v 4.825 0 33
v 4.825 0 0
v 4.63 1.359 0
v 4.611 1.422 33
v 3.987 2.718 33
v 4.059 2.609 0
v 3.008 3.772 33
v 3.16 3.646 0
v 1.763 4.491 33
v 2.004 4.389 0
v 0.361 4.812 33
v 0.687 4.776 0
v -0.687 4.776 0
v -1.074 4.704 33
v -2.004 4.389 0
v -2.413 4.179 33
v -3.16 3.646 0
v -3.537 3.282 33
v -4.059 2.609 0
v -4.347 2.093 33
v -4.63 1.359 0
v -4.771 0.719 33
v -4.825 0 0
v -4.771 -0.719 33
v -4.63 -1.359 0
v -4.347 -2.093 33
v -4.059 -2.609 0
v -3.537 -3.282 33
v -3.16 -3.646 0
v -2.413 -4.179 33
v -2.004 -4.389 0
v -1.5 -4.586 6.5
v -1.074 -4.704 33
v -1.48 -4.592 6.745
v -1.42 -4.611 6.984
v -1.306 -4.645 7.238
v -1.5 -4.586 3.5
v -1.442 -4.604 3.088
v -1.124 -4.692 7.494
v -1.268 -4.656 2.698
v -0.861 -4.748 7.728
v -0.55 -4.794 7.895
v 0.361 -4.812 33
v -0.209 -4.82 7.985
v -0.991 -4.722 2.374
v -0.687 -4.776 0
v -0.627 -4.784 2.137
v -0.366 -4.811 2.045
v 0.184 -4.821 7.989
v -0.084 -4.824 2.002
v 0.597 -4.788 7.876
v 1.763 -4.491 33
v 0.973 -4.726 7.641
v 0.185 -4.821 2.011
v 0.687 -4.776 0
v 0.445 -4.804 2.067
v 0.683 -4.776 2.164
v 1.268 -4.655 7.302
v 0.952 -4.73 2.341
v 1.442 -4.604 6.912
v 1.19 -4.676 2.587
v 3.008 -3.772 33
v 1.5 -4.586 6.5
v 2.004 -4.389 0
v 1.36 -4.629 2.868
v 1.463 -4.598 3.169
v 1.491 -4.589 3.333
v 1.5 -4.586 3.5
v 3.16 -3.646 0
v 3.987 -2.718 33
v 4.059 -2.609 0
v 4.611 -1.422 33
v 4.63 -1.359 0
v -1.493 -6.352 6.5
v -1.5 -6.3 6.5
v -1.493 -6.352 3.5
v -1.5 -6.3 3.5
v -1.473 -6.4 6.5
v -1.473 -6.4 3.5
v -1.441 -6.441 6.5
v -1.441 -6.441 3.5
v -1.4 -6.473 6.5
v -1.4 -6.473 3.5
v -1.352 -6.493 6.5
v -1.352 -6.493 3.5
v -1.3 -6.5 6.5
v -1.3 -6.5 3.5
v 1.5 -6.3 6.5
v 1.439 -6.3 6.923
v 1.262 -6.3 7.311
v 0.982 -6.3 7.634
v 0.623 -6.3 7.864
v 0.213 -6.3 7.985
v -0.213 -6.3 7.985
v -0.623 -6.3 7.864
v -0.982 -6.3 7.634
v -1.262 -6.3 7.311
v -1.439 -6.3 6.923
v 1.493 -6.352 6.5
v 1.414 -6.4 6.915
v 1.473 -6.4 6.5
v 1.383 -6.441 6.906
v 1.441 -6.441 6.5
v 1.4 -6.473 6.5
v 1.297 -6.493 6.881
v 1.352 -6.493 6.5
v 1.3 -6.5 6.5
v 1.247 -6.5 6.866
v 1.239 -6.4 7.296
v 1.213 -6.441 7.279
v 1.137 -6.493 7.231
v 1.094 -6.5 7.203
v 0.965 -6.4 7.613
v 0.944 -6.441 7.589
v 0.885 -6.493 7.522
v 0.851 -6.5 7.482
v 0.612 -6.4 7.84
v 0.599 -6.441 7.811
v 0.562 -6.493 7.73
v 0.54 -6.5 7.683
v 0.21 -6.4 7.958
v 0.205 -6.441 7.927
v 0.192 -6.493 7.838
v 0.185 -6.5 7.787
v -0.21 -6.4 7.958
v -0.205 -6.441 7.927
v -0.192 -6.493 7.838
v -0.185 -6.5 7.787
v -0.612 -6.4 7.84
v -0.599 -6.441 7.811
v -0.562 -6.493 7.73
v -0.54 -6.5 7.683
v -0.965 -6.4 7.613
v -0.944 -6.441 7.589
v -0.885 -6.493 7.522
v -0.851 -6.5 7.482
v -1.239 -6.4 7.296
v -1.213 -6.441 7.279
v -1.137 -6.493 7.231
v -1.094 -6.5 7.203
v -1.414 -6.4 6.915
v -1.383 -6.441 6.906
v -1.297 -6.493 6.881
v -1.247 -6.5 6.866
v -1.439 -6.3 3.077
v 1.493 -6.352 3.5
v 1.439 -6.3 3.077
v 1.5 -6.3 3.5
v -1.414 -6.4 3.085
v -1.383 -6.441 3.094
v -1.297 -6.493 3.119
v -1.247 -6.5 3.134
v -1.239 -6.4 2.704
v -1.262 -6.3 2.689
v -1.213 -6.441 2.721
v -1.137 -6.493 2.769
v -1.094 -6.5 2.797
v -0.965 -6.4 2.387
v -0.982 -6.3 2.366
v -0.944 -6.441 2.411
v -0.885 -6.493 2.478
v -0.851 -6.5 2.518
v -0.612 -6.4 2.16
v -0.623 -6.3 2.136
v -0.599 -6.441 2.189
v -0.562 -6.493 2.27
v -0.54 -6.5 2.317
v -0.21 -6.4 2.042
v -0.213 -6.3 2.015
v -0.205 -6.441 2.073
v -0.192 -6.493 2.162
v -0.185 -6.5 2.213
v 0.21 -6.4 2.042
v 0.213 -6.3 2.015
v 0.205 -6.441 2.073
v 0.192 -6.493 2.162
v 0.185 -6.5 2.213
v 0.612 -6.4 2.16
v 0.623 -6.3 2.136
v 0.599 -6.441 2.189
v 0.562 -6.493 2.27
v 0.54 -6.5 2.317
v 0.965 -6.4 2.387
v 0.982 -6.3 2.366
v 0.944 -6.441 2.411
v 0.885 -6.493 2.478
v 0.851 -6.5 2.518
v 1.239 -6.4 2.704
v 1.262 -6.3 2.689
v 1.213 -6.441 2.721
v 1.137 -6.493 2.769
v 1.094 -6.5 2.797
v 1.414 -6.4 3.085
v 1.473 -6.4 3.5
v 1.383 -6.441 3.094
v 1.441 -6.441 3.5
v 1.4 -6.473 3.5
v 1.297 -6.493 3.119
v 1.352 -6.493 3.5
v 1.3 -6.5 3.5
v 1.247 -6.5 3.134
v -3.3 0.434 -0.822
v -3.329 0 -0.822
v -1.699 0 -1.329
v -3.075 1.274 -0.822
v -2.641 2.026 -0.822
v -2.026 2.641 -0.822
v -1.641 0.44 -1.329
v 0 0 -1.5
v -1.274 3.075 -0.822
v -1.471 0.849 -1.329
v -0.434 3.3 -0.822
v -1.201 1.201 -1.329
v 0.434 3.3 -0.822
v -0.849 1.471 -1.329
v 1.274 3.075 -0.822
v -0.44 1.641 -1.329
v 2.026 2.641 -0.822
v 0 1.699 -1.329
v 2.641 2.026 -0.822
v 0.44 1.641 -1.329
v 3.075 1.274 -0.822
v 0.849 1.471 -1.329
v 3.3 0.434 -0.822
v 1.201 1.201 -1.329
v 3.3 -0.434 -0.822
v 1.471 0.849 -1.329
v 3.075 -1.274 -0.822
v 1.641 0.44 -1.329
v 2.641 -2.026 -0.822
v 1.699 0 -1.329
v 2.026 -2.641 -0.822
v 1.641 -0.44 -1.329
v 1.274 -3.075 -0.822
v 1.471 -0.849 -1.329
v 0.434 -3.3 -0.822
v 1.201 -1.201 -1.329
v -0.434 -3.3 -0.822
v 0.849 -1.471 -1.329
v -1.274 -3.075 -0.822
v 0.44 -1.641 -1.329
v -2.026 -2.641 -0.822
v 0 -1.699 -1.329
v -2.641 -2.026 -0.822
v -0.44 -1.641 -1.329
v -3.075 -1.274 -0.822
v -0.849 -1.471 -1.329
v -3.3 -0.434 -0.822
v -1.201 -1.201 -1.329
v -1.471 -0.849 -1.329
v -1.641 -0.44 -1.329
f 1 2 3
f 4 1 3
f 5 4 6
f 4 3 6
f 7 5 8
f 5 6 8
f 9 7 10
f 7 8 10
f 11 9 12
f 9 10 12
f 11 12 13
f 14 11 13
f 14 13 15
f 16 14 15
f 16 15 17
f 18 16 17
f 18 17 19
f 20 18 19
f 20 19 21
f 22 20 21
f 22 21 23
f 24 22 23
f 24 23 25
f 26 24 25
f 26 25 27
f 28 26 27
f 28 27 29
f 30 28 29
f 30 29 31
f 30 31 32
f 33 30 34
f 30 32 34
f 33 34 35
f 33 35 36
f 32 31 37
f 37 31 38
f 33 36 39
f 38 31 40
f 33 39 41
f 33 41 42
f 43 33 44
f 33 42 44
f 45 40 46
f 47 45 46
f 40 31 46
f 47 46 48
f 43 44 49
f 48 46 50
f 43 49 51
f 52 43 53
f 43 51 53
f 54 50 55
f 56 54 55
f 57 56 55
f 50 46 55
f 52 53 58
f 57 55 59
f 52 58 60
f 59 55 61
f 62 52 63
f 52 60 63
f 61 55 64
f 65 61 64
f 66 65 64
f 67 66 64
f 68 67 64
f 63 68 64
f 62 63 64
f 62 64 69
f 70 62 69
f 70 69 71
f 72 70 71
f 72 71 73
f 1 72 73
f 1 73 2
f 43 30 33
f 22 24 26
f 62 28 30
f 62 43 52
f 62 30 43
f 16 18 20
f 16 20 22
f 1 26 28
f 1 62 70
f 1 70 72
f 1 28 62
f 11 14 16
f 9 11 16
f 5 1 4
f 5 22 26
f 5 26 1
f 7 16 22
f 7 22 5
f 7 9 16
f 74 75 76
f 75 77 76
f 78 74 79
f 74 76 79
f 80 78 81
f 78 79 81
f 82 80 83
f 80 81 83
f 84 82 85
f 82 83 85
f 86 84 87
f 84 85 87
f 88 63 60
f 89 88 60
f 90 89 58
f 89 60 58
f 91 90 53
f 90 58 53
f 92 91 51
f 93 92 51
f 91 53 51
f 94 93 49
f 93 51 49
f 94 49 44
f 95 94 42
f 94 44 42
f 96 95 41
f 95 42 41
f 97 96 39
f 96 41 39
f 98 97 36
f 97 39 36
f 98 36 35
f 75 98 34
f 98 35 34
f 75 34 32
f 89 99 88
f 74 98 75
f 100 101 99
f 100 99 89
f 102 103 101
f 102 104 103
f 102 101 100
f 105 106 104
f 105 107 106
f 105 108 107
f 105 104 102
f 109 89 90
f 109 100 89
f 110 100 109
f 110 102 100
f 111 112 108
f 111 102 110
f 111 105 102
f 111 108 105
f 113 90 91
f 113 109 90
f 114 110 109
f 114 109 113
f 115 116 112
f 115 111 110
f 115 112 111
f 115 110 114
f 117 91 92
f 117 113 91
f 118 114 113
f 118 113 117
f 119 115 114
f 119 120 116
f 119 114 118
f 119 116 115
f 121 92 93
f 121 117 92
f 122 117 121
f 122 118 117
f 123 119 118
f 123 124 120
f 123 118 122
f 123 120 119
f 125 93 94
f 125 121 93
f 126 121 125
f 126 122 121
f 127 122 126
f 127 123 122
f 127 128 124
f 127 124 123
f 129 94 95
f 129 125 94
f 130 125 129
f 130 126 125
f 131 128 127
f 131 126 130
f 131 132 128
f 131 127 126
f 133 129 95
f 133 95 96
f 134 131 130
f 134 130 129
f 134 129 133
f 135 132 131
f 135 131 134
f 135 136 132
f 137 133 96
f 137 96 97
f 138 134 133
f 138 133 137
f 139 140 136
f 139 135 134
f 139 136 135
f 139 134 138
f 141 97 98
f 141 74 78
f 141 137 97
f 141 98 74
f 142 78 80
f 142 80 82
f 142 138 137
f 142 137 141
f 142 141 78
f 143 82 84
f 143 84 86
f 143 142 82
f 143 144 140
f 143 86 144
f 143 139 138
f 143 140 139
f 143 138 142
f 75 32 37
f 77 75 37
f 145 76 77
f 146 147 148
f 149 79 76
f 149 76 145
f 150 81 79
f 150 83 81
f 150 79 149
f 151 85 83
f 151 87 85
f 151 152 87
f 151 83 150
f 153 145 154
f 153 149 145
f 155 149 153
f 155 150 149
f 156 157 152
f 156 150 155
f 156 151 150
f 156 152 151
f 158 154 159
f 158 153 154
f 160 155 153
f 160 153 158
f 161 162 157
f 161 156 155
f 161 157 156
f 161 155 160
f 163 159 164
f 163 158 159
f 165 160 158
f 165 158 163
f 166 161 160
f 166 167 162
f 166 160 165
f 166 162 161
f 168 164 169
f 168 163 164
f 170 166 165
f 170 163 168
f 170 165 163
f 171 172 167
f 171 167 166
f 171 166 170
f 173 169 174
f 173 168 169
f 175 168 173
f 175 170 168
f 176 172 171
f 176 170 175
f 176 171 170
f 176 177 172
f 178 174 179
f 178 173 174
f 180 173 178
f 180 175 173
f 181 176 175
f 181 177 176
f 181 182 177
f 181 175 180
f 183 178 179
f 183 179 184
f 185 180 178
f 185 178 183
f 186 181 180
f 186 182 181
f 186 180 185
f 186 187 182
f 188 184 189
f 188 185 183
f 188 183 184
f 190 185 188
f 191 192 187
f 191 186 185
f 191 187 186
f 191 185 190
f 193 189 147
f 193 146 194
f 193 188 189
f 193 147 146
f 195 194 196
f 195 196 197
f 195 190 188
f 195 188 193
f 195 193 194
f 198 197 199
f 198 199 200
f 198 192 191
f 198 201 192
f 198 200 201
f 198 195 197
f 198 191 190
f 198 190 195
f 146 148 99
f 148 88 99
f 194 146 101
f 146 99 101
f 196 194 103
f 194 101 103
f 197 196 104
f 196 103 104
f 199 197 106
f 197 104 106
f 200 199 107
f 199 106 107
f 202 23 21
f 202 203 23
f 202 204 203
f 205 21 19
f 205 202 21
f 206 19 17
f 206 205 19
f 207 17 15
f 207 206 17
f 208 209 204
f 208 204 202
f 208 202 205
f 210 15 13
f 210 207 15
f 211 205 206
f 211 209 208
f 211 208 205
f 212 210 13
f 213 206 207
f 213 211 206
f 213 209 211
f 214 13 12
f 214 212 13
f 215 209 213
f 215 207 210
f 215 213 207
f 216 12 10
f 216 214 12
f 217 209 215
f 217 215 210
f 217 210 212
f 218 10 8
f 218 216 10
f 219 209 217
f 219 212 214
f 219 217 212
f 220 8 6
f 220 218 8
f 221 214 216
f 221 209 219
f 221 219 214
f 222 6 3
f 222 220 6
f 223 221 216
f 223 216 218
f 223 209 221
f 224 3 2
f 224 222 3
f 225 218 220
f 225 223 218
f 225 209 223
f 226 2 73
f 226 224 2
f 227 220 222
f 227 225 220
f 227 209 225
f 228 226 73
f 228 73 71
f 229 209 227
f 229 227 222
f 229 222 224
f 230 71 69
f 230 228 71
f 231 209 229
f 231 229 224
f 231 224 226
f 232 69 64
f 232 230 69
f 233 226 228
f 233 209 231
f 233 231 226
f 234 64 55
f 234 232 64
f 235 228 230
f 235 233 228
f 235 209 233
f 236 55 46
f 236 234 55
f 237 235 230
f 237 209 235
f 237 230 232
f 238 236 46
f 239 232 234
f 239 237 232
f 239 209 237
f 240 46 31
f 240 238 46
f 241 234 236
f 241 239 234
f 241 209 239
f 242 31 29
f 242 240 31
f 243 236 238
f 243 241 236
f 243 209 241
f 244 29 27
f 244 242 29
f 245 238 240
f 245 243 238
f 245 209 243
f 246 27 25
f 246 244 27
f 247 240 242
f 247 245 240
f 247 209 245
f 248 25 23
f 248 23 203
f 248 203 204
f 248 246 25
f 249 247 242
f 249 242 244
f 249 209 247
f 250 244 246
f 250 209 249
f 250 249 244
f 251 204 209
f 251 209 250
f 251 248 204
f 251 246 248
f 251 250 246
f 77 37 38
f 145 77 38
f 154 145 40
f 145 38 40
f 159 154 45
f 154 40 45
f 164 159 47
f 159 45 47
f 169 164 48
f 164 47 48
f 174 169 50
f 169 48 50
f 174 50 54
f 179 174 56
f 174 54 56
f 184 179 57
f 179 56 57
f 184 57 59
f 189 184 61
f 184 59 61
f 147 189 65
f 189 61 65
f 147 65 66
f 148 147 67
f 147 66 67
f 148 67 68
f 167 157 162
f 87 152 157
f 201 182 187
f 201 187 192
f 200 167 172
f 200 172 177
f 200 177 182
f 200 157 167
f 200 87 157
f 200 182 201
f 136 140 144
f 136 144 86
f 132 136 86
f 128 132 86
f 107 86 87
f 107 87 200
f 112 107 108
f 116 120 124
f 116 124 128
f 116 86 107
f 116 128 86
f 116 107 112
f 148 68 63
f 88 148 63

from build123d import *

# Parameters (mm, degrees)
F0_R     = 4.825
F1_DEPTH = 33
F3_DEPTH = 6.5
F4_R     = 0.2


with BuildPart() as f1:
    # F0 (on Top) → F1 (new body)
    with BuildSketch(Plane.XY):
        Circle(F0_R)
    extrude(amount=F1_DEPTH)

    # F2 (on Front) → F3 (join)
    with BuildSketch(Plane.XZ):
        with BuildLine():
            ThreePointArc((-1.5, 3.5), (0, 2), (1.5, 3.5))
            Line((1.5, 3.5), (1.5, 6.5))
            ThreePointArc((1.5, 6.5), (0, 8), (-1.5, 6.5))
            Line((-1.5, 6.5), (-1.5, 3.5))
        make_face()
    extrude(amount=F3_DEPTH)

    # F4
    f4_edges = [f1.edges().sort_by_distance(p)[0] for p in [
        (0, -6.5, 2),
        (1.5, -6.5, 5),
        (0, -6.5, 8),
        (-1.5, -6.5, 5),
    ]]
    fillet(f4_edges, radius=F4_R)

    # F5 (on Front) → F6 (revolve)
    with BuildSketch(Plane.XZ):
        with BuildLine():
            Line((0, 0), (-4.825, 0))
            ThreePointArc((-4.825, 0), (-2.5263919431, -1.1163524169), (0, -1.5))
            Line((0, -1.5), (0, 0))
        make_face()
    revolve(axis=Axis((0, 0, -1.4078605181), (0, 0, -1)))


solid = f1.part
